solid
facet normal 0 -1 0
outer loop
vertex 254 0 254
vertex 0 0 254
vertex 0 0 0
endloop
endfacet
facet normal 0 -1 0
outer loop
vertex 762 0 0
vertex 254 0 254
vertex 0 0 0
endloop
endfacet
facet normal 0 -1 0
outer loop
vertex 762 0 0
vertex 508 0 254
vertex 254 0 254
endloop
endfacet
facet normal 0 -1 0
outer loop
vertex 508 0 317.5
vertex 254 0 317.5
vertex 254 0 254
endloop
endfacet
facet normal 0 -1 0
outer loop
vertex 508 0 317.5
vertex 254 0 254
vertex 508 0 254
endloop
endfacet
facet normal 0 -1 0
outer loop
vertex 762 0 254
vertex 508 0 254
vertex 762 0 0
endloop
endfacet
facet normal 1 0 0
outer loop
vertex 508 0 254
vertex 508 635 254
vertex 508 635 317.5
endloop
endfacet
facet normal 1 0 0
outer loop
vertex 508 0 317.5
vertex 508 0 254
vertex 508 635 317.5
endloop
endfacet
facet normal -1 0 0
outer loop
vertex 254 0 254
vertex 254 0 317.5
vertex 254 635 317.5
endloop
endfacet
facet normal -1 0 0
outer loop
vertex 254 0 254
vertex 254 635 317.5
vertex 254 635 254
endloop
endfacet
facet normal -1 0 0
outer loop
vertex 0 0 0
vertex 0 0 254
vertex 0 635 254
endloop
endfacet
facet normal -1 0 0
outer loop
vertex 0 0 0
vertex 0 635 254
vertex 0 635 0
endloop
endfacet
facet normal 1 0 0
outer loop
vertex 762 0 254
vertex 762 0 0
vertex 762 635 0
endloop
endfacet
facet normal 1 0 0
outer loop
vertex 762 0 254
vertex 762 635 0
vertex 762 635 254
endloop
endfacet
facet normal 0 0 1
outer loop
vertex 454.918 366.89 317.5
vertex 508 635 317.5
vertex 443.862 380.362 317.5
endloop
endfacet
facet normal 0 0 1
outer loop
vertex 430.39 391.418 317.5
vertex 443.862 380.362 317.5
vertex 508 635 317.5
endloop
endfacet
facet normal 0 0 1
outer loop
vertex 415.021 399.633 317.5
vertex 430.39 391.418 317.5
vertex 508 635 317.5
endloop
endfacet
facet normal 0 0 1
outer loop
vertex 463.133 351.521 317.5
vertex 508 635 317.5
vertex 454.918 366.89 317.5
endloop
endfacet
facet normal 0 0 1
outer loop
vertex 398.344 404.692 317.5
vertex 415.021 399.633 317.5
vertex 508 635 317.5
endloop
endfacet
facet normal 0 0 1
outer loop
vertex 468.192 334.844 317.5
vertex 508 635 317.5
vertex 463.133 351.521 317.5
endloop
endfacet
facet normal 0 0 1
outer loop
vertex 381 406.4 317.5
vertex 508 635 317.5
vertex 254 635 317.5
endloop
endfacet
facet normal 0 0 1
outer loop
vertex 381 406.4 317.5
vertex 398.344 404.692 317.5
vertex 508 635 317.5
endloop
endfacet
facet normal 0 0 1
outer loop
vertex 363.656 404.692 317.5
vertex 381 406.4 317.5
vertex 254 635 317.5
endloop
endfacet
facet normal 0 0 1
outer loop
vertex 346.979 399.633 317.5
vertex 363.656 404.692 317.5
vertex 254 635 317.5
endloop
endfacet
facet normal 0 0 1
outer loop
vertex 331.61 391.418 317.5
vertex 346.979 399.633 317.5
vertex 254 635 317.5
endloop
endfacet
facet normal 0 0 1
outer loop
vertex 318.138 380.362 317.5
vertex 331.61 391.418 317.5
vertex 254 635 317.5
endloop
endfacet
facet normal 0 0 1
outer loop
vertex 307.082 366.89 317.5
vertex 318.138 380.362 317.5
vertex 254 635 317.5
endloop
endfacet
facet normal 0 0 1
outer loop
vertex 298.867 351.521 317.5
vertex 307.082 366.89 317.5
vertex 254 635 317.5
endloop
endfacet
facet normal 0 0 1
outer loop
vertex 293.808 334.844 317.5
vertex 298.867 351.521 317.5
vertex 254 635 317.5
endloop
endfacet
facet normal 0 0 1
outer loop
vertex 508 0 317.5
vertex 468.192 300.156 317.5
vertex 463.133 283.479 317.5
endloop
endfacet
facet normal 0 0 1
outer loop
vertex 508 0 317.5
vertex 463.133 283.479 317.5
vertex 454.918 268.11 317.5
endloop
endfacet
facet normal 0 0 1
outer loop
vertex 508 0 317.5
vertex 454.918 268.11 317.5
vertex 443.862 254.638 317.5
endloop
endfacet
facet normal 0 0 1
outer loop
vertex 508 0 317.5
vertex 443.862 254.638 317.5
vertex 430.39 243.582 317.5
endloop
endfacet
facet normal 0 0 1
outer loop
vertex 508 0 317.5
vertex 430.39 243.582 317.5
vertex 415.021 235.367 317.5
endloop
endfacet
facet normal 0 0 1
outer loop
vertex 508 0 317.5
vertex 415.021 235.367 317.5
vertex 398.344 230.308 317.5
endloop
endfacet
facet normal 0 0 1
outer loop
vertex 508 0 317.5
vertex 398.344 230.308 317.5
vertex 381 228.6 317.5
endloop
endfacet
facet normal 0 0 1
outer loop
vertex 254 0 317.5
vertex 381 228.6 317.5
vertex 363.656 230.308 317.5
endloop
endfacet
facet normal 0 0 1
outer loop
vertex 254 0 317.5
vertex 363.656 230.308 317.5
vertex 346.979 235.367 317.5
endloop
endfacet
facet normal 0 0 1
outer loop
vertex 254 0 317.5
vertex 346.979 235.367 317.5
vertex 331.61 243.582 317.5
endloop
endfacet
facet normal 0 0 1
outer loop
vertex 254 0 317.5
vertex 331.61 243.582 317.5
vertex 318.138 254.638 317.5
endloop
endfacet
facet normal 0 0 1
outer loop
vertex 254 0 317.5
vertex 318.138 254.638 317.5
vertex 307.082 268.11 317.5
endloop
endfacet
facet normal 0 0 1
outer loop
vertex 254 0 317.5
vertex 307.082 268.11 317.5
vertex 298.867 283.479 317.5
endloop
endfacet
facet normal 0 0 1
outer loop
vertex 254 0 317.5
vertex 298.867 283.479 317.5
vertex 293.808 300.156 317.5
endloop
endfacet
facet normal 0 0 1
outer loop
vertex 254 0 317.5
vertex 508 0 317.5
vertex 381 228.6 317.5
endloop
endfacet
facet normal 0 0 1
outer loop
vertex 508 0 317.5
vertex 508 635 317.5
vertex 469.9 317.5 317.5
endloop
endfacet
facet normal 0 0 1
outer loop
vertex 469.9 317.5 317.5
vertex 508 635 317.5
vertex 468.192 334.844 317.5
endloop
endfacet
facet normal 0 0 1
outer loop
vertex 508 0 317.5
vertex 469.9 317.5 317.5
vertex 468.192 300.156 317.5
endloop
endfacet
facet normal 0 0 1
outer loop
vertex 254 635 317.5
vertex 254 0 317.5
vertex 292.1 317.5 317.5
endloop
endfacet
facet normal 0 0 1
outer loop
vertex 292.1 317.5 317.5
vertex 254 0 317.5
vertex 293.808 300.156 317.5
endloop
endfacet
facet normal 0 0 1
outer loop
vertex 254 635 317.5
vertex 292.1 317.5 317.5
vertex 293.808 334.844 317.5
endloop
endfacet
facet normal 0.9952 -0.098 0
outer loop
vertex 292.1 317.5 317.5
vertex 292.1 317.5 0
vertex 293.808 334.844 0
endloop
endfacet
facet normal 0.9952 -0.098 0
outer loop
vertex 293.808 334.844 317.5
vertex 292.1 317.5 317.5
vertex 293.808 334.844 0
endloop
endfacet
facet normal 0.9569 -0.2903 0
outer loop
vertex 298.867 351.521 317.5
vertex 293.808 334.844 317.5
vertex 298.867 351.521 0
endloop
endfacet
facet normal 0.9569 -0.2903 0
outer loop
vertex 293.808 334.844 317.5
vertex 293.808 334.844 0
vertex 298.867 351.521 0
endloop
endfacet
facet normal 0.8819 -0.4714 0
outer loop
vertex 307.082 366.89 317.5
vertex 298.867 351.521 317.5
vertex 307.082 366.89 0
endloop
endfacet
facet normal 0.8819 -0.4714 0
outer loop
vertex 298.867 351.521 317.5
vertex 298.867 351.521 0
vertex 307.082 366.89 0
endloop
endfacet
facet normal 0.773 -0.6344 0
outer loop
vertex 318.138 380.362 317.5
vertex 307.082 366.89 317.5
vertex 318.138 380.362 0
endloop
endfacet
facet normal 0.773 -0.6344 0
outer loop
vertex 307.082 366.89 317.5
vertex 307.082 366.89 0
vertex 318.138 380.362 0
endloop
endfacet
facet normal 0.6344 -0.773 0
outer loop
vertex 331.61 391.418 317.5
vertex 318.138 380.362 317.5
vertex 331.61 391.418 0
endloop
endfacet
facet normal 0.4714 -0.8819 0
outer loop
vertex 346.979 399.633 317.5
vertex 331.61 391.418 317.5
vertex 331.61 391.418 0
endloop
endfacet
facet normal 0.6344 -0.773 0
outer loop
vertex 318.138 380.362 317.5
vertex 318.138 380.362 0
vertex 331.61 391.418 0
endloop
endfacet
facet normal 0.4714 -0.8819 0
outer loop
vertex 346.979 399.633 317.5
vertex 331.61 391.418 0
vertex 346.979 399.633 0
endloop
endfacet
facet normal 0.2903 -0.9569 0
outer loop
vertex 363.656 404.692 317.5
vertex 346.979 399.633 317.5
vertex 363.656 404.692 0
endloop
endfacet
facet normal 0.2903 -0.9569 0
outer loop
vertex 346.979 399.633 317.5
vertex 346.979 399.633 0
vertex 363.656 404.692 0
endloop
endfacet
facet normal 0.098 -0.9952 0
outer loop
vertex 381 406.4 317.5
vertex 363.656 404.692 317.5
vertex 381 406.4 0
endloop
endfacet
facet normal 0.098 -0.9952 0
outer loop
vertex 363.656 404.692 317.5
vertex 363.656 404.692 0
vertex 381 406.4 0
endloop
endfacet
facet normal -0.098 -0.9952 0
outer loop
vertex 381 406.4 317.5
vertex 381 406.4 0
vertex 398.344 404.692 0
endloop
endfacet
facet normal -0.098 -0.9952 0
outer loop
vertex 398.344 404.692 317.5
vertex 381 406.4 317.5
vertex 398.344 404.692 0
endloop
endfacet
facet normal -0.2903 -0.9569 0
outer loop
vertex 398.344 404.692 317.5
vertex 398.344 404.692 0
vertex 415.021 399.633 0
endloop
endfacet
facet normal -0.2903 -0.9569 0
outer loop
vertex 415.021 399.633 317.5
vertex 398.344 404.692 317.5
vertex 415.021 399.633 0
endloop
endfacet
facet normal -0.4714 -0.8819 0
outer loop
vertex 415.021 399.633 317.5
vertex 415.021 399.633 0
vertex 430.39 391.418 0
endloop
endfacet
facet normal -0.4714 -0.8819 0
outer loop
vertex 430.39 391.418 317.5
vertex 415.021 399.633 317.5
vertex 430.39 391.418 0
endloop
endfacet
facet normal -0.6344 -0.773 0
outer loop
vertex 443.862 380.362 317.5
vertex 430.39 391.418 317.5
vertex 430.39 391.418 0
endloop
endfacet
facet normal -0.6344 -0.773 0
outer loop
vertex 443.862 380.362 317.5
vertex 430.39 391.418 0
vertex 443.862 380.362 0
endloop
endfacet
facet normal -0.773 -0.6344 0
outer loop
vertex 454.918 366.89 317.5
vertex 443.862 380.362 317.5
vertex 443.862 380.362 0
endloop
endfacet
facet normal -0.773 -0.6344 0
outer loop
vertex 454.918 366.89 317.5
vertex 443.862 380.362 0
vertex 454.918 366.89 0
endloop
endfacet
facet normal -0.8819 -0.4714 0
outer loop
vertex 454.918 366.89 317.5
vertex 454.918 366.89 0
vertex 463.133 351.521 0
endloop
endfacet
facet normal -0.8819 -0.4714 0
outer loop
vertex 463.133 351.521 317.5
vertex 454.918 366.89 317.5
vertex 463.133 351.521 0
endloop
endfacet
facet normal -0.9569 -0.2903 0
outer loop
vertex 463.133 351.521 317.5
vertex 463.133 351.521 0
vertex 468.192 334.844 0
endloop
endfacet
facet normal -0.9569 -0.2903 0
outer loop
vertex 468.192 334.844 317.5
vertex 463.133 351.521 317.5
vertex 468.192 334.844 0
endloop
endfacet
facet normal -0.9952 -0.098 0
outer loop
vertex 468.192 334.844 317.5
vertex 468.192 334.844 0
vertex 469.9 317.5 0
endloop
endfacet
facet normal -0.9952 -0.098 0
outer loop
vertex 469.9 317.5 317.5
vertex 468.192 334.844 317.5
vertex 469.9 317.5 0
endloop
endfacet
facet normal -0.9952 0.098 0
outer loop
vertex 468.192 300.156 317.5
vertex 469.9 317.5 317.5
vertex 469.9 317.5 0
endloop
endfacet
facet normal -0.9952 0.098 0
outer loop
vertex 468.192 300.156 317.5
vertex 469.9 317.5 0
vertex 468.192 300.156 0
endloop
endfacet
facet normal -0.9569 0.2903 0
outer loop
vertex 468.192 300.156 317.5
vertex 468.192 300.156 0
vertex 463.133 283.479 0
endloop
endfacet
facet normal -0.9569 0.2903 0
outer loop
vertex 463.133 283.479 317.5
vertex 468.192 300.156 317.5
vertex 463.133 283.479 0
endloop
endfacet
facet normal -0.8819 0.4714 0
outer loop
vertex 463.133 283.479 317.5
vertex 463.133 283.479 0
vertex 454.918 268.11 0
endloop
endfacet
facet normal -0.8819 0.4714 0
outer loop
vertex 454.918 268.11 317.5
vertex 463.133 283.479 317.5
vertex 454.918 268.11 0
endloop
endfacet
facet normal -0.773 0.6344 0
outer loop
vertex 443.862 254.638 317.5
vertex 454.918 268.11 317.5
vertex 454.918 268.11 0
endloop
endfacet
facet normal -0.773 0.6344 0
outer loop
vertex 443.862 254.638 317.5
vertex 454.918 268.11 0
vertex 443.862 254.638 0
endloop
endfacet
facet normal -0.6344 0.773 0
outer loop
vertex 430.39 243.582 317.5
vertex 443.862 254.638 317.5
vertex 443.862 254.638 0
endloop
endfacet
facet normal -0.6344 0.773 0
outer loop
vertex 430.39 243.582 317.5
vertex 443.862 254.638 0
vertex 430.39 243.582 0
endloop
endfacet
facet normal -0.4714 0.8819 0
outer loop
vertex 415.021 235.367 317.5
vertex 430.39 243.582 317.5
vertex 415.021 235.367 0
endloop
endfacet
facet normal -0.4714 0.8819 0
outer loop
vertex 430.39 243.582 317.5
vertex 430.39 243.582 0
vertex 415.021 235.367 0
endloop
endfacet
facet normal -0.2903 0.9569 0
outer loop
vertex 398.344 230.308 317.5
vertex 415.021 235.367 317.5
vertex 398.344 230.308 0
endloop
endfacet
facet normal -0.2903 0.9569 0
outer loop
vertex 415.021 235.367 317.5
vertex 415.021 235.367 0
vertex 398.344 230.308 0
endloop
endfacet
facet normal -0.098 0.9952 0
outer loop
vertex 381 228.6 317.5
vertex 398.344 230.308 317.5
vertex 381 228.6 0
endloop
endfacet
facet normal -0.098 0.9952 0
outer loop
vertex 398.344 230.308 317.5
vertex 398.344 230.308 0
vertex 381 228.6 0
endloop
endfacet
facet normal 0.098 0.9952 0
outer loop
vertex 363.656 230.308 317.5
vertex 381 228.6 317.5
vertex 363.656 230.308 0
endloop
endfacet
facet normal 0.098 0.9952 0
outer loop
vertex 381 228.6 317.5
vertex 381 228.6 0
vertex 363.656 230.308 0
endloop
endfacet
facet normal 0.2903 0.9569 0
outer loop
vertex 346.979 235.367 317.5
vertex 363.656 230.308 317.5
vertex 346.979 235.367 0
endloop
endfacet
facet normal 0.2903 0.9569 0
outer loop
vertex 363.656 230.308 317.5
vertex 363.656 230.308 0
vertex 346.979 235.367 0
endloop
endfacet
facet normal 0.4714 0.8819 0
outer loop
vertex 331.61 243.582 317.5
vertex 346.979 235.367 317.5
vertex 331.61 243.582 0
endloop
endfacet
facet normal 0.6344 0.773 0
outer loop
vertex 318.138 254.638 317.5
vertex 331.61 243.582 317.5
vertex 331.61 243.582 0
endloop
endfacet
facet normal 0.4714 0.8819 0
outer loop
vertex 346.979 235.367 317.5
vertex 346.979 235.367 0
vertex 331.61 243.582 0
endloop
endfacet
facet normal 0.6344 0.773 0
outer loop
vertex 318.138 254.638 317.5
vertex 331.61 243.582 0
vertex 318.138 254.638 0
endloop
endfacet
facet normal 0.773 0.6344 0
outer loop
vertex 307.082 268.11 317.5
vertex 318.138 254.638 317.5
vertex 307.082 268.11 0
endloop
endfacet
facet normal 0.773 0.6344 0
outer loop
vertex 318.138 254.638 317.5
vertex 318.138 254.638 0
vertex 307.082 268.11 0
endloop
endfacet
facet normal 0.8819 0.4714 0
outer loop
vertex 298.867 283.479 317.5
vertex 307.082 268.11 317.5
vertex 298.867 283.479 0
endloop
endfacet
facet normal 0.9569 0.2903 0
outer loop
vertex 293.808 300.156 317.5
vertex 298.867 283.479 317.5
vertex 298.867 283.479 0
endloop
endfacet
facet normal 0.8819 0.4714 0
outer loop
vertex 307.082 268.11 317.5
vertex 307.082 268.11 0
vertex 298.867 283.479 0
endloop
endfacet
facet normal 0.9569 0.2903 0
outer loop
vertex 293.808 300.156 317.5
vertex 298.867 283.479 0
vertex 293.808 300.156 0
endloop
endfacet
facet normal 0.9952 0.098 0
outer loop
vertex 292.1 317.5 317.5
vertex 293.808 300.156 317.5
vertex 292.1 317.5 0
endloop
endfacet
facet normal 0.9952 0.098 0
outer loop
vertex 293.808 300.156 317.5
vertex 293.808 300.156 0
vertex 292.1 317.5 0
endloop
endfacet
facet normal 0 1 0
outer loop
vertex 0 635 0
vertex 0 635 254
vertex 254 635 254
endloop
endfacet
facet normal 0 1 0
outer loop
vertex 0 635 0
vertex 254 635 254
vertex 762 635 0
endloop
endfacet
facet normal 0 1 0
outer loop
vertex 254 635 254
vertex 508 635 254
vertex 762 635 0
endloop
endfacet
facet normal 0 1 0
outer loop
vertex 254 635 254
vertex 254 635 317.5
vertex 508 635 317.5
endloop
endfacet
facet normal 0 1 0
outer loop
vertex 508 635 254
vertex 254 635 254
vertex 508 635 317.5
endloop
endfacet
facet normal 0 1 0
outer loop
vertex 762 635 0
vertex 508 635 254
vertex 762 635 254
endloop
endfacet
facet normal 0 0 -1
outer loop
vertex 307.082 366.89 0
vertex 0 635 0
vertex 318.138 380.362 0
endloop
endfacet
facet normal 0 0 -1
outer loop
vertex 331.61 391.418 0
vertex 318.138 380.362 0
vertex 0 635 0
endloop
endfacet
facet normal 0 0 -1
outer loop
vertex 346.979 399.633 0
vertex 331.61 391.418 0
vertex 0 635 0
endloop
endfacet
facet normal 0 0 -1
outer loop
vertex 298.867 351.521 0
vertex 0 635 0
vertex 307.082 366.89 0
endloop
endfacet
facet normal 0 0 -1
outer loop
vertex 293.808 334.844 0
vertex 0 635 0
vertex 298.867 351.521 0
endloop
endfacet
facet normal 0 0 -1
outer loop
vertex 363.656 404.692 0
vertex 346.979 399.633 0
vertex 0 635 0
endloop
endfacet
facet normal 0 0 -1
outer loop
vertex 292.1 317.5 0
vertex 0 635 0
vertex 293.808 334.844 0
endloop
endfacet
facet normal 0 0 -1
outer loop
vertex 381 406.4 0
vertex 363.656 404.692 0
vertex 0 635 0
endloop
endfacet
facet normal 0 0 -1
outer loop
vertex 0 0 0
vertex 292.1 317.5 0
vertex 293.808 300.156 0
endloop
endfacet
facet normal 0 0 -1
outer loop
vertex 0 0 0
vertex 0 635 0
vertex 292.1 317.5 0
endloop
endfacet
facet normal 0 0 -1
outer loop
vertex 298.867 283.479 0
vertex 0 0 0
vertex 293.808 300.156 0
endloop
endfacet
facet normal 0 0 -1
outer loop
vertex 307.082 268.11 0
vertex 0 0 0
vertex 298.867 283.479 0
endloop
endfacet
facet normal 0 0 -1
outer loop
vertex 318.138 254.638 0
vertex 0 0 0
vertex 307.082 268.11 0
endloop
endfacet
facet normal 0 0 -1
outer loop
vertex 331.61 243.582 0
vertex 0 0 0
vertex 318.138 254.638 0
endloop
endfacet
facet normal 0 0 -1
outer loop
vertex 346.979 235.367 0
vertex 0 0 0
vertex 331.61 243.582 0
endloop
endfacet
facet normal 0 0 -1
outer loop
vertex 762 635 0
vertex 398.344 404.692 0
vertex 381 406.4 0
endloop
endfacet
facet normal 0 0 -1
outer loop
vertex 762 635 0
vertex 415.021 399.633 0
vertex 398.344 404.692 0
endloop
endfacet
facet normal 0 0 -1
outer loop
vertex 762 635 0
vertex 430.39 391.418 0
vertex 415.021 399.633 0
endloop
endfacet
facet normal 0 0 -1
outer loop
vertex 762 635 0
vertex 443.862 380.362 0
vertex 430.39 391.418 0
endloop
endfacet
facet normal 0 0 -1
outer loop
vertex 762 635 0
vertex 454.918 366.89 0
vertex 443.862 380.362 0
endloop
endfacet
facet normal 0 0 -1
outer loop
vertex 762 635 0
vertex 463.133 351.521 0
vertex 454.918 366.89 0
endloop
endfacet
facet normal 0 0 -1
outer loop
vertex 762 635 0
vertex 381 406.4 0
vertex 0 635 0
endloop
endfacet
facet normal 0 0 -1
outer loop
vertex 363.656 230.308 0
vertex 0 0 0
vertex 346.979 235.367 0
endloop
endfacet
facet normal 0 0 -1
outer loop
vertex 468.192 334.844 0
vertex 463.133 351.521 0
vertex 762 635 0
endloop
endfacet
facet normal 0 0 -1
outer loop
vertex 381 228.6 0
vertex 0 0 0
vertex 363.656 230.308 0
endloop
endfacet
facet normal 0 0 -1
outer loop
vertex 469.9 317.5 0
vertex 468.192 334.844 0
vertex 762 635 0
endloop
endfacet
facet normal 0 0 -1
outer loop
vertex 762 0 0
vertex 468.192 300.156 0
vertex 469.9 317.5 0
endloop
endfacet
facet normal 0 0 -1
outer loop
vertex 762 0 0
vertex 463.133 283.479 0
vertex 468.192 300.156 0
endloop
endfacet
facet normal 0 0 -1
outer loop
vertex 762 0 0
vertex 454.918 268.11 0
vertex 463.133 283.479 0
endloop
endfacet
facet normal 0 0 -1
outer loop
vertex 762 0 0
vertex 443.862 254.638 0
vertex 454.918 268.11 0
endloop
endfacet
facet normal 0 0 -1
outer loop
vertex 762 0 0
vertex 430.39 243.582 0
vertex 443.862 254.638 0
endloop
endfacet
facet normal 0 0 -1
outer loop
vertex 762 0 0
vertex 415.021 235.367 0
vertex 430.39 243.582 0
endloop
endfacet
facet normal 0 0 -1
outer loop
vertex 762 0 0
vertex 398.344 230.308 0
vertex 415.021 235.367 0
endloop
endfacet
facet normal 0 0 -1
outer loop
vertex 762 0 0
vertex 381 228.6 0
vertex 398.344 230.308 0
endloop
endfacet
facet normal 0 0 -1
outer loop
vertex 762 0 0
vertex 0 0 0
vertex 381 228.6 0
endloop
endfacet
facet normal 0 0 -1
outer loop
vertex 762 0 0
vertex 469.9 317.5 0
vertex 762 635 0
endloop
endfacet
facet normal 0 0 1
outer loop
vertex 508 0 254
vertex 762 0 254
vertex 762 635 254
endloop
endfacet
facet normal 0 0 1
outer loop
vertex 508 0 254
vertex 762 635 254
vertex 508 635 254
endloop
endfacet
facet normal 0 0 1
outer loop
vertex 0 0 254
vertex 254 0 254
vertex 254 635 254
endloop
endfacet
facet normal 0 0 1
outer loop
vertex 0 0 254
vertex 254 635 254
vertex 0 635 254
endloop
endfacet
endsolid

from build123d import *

# Parameters (mm, degrees)
F1_DEPTH = 635
F3_D     = 177.8


with BuildPart() as f1:
    # F0 (on Front) → F1 (new body)
    with BuildSketch(Plane.XZ):
        Polygon((0, 254), (0, 0), (762, 0), (762, 254), (508, 254), (508, 317.5), (254, 317.5), (254, 254), align=None)
    extrude(amount=-F1_DEPTH)

    # F3 (through all)
    with Locations(Plane.XY.offset(317.5)):
        with Locations((381, 317.5)):
            Hole(F3_D / 2)


solid = f1.part
